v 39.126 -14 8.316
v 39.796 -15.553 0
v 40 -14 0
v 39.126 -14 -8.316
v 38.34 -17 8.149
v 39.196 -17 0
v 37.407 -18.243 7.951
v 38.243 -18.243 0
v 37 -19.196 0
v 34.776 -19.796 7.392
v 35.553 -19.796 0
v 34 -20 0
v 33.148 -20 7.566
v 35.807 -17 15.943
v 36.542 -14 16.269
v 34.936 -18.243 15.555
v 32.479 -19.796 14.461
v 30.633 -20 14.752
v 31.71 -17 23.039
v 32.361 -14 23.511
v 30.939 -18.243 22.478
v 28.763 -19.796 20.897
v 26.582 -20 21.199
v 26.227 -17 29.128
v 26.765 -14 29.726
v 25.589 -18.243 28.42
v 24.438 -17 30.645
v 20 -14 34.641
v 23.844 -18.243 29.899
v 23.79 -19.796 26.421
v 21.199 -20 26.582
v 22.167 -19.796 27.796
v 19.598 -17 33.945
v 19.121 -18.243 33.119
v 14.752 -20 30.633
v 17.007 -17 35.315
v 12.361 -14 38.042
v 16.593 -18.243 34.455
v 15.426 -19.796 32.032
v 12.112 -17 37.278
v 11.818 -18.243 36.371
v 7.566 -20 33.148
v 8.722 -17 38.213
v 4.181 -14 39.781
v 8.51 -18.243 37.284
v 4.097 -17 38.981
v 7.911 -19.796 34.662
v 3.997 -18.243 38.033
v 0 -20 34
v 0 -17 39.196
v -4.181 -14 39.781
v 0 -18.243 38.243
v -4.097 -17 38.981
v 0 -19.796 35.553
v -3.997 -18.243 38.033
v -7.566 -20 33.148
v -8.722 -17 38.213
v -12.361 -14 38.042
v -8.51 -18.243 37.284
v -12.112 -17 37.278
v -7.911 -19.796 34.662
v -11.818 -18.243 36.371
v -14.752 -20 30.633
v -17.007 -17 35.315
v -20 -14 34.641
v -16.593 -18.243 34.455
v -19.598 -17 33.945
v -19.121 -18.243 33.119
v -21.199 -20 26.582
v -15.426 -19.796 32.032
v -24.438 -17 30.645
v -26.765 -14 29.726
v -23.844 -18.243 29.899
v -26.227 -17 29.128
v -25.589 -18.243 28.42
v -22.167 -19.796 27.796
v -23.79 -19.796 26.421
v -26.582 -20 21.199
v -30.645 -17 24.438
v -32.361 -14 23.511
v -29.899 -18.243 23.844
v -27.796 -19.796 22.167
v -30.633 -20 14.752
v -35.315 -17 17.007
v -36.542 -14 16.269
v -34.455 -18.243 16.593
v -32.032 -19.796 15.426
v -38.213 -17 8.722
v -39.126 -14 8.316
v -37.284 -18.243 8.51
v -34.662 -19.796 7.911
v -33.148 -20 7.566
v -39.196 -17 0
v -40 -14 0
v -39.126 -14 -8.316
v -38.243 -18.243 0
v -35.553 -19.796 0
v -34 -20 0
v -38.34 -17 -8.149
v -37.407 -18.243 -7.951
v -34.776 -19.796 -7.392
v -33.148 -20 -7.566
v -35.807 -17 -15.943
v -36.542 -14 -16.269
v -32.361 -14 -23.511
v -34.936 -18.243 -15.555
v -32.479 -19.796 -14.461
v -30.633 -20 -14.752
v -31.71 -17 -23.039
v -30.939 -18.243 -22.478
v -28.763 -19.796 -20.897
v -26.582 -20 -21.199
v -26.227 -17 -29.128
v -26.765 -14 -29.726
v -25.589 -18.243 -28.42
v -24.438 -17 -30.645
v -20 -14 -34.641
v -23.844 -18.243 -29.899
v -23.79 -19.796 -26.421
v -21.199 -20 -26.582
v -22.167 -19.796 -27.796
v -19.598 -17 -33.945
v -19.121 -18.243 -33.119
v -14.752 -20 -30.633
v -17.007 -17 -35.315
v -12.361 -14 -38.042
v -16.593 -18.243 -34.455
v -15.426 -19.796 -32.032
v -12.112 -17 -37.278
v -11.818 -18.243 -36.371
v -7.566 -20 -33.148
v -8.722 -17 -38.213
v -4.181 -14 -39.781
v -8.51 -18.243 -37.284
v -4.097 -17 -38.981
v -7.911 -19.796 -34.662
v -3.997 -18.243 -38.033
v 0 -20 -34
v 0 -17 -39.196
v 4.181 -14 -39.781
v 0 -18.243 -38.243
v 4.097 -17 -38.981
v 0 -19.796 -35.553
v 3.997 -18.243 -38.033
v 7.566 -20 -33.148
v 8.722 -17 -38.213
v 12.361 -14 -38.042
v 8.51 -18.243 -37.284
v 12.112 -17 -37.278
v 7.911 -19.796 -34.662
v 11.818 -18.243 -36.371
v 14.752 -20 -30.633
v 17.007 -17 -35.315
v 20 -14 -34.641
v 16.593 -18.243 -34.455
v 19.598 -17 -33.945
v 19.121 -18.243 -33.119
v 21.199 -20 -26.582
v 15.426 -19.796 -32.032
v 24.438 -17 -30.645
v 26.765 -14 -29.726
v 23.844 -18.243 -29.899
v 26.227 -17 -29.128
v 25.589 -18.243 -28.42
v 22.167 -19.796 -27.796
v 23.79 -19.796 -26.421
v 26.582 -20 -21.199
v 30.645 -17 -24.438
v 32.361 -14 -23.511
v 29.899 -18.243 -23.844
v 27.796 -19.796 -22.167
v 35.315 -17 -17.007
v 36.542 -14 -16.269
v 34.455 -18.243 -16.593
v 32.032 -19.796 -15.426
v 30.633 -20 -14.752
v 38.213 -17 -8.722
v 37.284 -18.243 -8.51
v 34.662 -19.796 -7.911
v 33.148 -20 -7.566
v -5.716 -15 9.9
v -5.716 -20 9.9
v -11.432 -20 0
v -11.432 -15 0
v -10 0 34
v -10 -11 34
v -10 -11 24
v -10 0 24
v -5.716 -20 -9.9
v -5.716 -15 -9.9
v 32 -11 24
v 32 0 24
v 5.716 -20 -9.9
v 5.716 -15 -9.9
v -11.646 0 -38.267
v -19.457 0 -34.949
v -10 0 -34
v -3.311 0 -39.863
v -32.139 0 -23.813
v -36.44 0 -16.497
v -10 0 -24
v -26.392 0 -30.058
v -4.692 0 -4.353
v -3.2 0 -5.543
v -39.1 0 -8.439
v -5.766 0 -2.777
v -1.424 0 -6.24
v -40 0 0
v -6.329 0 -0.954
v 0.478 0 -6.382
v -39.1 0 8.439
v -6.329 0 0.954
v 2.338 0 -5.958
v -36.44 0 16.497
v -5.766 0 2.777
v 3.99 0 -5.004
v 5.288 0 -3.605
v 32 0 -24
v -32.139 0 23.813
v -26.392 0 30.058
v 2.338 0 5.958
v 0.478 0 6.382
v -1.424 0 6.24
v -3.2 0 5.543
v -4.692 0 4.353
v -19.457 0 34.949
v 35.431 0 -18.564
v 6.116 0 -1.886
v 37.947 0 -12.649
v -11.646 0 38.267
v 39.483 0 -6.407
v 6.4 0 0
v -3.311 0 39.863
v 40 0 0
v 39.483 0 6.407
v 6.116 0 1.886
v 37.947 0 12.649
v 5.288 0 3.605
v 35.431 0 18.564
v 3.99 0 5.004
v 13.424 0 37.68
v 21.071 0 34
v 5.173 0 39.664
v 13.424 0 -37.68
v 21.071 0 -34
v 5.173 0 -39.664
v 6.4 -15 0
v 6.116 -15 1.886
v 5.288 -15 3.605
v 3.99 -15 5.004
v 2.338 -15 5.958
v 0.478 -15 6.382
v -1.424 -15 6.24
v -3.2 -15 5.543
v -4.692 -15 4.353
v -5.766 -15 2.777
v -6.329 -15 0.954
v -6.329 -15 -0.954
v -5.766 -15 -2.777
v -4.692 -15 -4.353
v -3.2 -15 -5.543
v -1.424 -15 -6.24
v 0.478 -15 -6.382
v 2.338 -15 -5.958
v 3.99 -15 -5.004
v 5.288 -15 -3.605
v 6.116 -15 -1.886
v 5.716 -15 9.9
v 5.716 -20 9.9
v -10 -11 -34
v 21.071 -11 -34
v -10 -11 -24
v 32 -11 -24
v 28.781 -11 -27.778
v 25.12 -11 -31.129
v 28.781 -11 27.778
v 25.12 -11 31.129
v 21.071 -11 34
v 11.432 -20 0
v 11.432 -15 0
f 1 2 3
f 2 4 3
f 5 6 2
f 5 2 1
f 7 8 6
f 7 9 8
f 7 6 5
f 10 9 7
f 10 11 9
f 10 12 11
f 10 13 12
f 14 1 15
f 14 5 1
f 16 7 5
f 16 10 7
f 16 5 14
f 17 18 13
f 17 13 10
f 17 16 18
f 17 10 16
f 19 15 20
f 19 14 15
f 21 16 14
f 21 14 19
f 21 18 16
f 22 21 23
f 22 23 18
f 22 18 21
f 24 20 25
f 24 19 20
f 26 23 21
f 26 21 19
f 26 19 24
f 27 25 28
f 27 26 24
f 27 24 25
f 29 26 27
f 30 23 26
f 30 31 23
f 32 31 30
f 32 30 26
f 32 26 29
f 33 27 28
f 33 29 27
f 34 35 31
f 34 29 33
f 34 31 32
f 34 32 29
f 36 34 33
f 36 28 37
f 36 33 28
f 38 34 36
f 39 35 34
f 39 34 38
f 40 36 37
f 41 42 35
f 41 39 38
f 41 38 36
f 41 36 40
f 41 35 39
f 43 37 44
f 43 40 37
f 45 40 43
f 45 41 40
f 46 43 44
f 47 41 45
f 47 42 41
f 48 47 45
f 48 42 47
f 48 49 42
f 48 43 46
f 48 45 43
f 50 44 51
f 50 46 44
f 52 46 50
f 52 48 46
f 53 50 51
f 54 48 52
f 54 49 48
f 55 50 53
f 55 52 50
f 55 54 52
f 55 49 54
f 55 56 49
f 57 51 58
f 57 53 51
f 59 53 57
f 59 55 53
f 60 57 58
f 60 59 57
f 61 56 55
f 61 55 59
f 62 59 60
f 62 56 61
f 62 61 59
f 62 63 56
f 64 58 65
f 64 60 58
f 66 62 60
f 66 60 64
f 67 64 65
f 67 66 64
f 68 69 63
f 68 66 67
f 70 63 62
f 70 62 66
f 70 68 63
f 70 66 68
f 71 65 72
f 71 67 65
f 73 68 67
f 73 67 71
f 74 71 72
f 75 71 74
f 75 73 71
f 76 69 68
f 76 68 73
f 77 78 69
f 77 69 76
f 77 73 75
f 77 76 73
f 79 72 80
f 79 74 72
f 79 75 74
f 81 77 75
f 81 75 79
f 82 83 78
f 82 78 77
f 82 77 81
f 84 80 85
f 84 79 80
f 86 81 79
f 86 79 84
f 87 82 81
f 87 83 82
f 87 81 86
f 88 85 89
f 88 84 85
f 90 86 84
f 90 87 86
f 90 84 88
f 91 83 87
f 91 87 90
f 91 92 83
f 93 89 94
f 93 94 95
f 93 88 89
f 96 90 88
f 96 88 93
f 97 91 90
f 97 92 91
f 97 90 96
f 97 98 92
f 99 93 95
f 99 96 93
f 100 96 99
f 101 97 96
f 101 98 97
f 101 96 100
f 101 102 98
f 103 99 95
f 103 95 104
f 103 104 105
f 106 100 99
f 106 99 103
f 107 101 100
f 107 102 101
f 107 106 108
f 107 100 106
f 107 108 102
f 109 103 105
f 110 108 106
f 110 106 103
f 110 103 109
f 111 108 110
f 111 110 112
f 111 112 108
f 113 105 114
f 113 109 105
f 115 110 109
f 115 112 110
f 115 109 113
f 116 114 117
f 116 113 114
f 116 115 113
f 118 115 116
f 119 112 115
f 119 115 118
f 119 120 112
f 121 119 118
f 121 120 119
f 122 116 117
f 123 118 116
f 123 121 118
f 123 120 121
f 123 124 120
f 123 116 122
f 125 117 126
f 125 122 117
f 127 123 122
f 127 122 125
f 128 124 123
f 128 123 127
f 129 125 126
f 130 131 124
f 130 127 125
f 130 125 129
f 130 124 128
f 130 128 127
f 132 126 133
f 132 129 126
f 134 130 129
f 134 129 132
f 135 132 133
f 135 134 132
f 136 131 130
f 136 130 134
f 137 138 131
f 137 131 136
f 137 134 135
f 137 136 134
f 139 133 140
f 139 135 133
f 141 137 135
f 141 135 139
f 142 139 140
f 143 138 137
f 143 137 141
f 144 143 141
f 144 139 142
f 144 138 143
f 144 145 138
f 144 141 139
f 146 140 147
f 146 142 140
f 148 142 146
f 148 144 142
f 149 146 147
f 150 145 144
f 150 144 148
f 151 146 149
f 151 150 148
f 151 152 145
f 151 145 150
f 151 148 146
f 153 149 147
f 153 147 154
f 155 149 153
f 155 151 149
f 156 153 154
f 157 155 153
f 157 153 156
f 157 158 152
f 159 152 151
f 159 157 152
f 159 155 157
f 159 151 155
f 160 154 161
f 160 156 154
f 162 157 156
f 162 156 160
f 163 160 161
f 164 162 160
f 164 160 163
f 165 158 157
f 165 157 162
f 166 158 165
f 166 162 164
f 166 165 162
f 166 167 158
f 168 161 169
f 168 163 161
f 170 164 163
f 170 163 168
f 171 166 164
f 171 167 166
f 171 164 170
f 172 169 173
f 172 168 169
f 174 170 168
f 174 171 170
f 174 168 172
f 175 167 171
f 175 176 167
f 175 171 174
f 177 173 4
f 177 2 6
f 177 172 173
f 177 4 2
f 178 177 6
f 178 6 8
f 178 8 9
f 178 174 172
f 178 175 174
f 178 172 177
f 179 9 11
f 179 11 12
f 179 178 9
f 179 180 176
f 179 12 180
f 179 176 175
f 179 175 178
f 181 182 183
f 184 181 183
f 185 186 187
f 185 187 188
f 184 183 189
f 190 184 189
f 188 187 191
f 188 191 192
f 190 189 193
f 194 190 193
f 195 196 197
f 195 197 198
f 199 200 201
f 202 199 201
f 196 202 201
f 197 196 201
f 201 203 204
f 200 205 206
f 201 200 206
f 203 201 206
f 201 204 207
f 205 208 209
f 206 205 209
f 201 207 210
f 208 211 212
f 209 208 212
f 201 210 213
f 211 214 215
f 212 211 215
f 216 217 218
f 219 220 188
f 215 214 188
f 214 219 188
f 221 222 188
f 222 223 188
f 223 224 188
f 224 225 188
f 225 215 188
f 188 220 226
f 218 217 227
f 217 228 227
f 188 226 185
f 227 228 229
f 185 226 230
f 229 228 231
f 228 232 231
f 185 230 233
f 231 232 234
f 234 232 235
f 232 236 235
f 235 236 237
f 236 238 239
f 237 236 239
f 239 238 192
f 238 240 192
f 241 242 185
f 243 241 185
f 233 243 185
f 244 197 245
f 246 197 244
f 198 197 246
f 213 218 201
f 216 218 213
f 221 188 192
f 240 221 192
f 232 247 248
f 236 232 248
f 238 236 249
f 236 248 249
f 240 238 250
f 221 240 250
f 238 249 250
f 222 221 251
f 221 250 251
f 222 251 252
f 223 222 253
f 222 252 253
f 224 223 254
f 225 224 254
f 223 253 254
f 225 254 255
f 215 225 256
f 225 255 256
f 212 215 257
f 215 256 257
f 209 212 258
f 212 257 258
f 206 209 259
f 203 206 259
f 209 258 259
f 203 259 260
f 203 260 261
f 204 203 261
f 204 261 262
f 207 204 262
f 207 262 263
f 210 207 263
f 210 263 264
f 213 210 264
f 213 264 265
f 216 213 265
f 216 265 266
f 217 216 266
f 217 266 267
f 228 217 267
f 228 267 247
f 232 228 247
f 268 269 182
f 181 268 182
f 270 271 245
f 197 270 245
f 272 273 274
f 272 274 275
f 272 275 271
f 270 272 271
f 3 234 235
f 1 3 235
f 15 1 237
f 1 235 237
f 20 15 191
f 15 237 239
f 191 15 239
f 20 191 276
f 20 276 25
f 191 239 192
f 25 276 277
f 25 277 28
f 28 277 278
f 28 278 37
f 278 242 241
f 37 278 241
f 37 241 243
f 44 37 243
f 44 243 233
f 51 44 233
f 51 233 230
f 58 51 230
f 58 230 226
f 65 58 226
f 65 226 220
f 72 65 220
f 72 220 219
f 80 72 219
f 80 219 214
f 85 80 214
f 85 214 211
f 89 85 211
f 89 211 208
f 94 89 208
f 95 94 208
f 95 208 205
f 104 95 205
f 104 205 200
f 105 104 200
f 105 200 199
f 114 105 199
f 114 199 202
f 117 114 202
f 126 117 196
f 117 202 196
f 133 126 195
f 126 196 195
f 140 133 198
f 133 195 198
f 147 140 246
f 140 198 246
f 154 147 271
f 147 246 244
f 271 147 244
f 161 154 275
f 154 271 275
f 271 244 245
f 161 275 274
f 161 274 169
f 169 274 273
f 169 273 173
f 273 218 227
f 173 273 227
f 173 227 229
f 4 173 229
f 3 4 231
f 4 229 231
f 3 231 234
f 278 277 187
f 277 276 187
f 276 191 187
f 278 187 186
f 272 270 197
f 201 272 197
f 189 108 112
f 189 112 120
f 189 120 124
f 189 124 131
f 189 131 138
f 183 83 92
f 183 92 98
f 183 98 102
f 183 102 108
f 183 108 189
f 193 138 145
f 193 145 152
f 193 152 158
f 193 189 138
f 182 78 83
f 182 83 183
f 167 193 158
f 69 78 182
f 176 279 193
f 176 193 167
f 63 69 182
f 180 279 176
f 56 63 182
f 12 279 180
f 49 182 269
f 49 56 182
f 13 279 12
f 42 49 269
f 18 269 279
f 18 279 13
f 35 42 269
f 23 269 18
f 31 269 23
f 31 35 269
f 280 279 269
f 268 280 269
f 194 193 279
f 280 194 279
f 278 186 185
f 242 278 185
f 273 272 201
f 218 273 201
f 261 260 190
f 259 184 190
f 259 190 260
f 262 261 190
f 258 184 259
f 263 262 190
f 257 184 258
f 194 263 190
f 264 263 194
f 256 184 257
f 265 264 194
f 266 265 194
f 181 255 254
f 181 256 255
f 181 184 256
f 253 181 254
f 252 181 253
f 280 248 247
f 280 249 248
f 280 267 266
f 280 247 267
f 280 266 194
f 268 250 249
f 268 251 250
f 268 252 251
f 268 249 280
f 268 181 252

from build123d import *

# Parameters (mm, degrees)
F0_R          = 40
F1_DEPTH      = 20
F2_W          = 11
F2_H          = 10
F3_DEPTH      = 50
F3_DEPTH_BACK = 10
F4_R          = 6
F6_DEPTH      = 5
F7_R          = 6.4
F8_DEPTH      = 25


# Not quite as in the source:
# - a pattern or mirror of a feature is missing from the dataset's text; its kind, count and spacing are read off the source's solid


with BuildPart() as f1:
    # F0 (on Front) → F1 (new body)
    with BuildSketch(Plane.XZ):
        Circle(F0_R)
    extrude(amount=F1_DEPTH)

    # F2 (on Right) → F3 (cut, two sides)
    with BuildSketch(Plane.YZ) as f3_sk:
        with Locations((-5.5, 29)):
            Rectangle(F2_W, F2_H)
    f3 = extrude(amount=F3_DEPTH, mode=Mode.SUBTRACT) + extrude(f3_sk.sketch, amount=-F3_DEPTH_BACK, mode=Mode.SUBTRACT)

    # F3_copies: F3 across plane
    add(f3.mirror(Plane(origin=(0, 0, 0), x_dir=(-1, 0, 0), z_dir=(0, 0, -1))), mode=Mode.SUBTRACT)

    # F4
    f4_edges = [f1.edges().sort_by_distance(p)[0] for p in [
        (-40, -20, 0),
    ]]
    fillet(f4_edges, radius=F4_R)

    # F5 (on face) → F6 (cut)
    with BuildSketch(Plane.XZ.offset(20)):
        Polygon((-5.715767665, -9.9), (5.715767665, -9.9), (11.43153533, 0), (5.715767665, 9.9), (-5.715767665, 9.9), (-11.43153533, 0), align=None)
    extrude(amount=-F6_DEPTH, mode=Mode.SUBTRACT)

    # F7 (on face) → F8 (cut)
    with BuildSketch(Plane.XZ.offset(15)):
        Circle(F7_R)
    extrude(amount=-F8_DEPTH, mode=Mode.SUBTRACT)


solid = f1.part
